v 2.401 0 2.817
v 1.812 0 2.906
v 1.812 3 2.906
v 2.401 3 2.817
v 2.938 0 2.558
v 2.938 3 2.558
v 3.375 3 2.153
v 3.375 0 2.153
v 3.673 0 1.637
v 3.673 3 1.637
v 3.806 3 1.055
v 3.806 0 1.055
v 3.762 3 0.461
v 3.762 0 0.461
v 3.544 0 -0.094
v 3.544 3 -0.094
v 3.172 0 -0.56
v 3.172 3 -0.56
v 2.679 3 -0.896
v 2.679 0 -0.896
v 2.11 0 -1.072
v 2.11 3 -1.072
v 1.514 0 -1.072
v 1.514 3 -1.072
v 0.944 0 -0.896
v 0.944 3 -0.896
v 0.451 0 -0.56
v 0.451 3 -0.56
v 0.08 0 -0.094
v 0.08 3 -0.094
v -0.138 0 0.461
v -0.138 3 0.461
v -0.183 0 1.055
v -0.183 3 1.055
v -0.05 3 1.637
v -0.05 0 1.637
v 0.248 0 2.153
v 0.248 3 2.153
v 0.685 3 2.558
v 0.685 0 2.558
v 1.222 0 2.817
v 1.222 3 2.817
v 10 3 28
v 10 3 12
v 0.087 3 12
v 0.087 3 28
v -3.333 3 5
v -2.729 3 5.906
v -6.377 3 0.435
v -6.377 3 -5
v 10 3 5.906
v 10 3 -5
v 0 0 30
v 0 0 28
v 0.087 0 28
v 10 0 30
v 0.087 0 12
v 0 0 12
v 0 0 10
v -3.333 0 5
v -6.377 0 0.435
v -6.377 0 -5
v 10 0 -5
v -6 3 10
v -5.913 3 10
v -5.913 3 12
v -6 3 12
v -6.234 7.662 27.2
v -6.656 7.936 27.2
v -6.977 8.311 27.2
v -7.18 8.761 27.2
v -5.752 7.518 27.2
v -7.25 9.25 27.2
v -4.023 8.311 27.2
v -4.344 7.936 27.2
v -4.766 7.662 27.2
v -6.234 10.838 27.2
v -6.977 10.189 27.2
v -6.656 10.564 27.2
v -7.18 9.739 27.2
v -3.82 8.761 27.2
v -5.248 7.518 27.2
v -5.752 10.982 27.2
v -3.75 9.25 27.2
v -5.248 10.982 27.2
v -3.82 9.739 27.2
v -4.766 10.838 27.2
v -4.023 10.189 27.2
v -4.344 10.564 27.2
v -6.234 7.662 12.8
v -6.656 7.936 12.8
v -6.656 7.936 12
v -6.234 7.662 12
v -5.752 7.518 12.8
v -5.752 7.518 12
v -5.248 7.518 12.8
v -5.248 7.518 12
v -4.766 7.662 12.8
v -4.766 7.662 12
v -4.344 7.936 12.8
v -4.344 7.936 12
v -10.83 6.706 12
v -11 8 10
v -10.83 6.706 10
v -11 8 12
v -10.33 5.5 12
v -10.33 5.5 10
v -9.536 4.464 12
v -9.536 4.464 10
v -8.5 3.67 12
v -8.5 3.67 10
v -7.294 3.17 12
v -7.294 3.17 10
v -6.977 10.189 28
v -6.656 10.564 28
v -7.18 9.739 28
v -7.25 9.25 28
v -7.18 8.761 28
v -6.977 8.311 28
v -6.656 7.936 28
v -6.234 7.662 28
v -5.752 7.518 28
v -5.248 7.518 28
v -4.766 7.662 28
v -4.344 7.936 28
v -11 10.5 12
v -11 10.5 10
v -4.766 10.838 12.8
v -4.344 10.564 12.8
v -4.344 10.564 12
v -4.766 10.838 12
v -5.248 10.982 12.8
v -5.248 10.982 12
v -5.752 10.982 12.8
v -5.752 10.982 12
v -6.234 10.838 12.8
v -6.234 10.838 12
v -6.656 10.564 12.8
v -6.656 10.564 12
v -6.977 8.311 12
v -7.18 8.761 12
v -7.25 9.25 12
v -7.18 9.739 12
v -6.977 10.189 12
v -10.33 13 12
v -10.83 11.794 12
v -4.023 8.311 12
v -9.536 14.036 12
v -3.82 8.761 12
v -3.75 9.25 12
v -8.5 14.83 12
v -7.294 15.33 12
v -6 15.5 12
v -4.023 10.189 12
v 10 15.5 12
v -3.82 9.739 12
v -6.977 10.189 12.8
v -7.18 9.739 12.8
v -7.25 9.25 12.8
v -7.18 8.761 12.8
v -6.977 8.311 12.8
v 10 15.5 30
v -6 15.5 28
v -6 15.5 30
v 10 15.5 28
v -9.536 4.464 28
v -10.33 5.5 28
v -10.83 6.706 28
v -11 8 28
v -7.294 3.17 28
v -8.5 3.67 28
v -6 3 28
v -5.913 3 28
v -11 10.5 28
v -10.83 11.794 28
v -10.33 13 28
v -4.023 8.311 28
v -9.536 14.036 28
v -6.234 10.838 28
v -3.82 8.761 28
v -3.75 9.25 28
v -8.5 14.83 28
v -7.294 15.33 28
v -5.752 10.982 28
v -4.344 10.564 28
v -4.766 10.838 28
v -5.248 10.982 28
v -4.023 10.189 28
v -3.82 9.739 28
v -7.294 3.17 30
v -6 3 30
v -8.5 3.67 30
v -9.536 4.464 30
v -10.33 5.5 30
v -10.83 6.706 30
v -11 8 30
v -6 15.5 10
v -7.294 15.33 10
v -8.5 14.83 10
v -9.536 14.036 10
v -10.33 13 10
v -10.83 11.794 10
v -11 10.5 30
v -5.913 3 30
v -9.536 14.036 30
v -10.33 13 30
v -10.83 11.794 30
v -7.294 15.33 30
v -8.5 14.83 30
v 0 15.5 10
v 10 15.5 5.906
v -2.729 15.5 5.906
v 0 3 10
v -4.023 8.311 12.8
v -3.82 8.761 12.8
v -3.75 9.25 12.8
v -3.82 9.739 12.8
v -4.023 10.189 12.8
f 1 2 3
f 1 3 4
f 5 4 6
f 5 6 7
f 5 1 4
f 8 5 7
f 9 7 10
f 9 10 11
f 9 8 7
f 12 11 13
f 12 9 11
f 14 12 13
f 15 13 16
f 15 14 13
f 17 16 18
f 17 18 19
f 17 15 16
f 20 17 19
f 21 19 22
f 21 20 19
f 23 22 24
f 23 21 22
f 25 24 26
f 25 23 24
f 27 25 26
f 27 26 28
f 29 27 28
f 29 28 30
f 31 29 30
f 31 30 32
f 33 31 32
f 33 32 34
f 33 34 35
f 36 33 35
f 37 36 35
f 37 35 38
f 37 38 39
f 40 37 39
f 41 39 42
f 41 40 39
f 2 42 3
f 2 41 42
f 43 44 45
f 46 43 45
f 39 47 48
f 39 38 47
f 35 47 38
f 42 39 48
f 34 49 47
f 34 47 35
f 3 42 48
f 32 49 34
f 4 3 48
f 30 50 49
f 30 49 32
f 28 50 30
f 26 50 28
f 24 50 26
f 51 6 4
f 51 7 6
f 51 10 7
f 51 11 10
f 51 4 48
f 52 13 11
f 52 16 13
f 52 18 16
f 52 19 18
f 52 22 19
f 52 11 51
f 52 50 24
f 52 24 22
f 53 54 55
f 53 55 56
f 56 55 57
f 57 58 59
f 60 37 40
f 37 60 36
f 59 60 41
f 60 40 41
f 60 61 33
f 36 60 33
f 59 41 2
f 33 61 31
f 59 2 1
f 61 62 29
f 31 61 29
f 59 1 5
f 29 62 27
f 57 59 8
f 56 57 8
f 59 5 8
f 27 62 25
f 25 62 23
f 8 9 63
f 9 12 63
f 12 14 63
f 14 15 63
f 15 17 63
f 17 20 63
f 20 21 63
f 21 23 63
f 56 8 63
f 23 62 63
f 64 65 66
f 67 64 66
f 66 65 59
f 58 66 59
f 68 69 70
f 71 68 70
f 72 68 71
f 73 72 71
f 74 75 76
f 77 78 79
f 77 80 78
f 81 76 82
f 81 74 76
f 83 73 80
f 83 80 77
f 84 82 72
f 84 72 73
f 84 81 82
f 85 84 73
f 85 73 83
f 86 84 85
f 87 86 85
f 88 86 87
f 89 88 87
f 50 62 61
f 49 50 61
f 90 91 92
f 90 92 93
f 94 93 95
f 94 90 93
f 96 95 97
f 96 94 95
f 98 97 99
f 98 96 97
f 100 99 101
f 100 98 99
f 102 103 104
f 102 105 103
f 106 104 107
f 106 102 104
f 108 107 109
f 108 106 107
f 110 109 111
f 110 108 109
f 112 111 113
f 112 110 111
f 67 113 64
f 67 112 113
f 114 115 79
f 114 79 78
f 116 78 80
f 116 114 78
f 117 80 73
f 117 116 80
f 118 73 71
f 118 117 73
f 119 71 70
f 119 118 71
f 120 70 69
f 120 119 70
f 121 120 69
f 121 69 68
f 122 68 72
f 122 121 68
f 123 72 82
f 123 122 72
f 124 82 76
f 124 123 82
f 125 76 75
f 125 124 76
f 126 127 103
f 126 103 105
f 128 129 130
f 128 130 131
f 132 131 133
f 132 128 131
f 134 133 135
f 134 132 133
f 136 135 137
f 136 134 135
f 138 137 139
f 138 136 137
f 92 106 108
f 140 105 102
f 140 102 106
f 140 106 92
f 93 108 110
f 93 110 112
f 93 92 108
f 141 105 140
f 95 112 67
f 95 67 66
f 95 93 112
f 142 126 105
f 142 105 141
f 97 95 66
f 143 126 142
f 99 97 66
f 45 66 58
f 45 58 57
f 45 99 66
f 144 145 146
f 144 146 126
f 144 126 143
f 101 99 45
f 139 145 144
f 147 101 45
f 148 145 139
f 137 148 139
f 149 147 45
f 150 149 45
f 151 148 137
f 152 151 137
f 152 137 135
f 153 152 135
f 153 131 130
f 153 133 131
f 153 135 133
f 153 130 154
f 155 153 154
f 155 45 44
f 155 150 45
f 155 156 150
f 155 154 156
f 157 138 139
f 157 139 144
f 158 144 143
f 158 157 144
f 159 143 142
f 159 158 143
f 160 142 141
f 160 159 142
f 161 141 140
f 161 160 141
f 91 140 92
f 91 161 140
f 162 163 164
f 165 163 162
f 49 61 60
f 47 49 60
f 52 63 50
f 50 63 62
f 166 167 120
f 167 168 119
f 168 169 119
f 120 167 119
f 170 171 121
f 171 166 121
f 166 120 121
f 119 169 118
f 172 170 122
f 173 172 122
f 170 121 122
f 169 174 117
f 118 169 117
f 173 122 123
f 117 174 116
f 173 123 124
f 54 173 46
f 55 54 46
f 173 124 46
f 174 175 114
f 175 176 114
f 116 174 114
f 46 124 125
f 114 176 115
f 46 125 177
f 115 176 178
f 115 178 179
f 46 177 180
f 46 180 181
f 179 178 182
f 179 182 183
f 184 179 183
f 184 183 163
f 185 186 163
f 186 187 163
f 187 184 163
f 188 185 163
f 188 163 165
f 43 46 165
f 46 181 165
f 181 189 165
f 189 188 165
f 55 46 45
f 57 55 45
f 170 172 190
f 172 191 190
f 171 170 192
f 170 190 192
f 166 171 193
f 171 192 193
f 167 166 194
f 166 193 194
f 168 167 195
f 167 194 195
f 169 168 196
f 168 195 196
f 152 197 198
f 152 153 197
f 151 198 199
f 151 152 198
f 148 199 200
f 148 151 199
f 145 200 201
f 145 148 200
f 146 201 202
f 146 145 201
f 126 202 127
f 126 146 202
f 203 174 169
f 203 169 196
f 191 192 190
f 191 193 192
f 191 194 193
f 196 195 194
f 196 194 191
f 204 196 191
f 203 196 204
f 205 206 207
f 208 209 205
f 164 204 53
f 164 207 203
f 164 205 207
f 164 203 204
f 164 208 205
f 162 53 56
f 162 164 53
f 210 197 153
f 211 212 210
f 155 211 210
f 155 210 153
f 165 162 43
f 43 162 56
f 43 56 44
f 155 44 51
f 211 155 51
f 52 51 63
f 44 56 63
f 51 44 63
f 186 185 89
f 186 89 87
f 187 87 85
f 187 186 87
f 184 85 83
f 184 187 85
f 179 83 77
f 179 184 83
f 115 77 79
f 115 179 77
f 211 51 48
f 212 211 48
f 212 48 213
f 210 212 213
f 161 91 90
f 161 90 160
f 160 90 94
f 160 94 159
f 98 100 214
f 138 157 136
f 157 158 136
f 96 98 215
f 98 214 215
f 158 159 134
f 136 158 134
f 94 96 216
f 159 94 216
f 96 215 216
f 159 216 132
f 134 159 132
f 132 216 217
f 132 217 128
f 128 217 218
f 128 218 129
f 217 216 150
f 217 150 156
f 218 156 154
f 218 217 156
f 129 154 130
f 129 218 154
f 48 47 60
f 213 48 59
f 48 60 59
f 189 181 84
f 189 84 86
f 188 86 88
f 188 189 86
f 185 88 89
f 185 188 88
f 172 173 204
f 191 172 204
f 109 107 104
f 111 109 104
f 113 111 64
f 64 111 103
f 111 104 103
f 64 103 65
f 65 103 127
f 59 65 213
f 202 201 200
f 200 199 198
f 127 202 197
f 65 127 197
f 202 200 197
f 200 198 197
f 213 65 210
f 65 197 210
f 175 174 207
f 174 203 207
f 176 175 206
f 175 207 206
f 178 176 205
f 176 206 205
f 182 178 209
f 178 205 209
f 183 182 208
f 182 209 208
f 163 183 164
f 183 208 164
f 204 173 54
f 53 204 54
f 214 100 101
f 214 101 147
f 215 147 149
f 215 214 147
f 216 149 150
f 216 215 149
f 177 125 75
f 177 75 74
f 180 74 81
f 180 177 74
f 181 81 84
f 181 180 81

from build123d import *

# Parameters (mm, degrees)
ESBO_O1_R                     = 2
ESBO_O1_W                     = 10
ESBO_O1_H                     = 16
ESBO_O1_H_2                   = 2
RESSALTO_EXTRUS_O1_DEPTH      = 3
ESBO_O1_4_W                   = 10
ESBO_O1_4_H                   = 2
RESSALTO_EXTRUS_O5_DEPTH      = 15.5
RESSALTO_EXTRUS_O6_DEPTH      = 12.5
ESBO_O11_W                    = 2
ESBO_O11_H                    = 12.5
RESSALTO_EXTRUS_O7_DEPTH      = 11
RESSALTO_EXTRUS_O8_DEPTH      = 18
ESBO_O8_W                     = 14.4
ESBO_O8_H                     = 12.5
CORTE_EXTRUS_O1_DEPTH         = 40.764934301
FILETE1_R                     = 5
RESSALTO_EXTRUS_O9_DEPTH      = 2
RESSALTO_EXTRUS_O9_DEPTH_BACK = 18
ESBO_O18_W                    = 6
ESBO_O18_H                    = 16
CORTE_EXTRUS_O3_DEPTH         = 35.311076929


with BuildPart() as part:
    # Esboço1 → Ressalto-extrusão1 (new body)
    # profile 1 of 9: a face of its own
    with BuildSketch(Plane(origin=(0, 0, 0), x_dir=(1, 0, 0), z_dir=(0, 1, 0))):
        Polygon((10, 5), (-6.376571145, 5), (-6.376571145, -0.435143283), (-3.333333333, -5), (10, -5), align=None)
        with Locations(Location((1.811714428, -0.905857214, 0), (0, 0, 270))):
            Circle(ESBO_O1_R, mode=Mode.SUBTRACT)
    # profile 2 of 9: a face of its own
    with BuildSketch(Plane(origin=(0, 0, 0), x_dir=(1, 0, 0), z_dir=(0, 1, 0))):
        Polygon((10, -5), (-3.333333333, -5), (0, -10), (5, -10), (10, -10), align=None)
    # profile 3 of 9: a face of its own
    with BuildSketch(Plane(origin=(0, 0, 0), x_dir=(1, 0, 0), z_dir=(0, 1, 0))):
        Polygon((10, -5), (-3.333333333, -5), (0, -10), (5, -10), (10, -10), align=None)
    # profile 4 of 9: a face of its own
    with BuildSketch(Plane(origin=(0, 0, 0), x_dir=(1, 0, 0), z_dir=(0, 1, 0))):
        Polygon((10, -5), (-3.333333333, -5), (0, -10), (5, -10), (10, -10), align=None)
    # profile 5 of 9: a face of its own
    with BuildSketch(Plane(origin=(0, 0, 0), x_dir=(1, 0, 0), z_dir=(0, 1, 0))):
        Polygon((10, -5), (-3.333333333, -5), (0, -10), (5, -10), (10, -10), align=None)
    # profile 6 of 9: a face of its own
    with BuildSketch(Plane(origin=(0, 0, 0), x_dir=(1, 0, 0), z_dir=(0, 1, 0))):
        with Locations((5, -20)):
            Rectangle(ESBO_O1_W, ESBO_O1_H)
    # profile 7 of 9: a face of its own
    with BuildSketch(Plane(origin=(0, 0, 0), x_dir=(1, 0, 0), z_dir=(0, 1, 0))):
        with Locations((5, -29)):
            Rectangle(ESBO_O1_W, ESBO_O1_H_2)
    # profile 8 of 9: a face of its own
    with BuildSketch(Plane(origin=(0, 0, 0), x_dir=(1, 0, 0), z_dir=(0, 1, 0))):
        with Locations((5, -20)):
            Rectangle(ESBO_O1_W, ESBO_O1_H)
    # profile 9 of 9: a face of its own
    with BuildSketch(Plane(origin=(0, 0, 0), x_dir=(1, 0, 0), z_dir=(0, 1, 0))):
        Polygon((5, -10), (0, -10), (0, -12), (10, -12), (10, -10), align=None)
    extrude(amount=RESSALTO_EXTRUS_O1_DEPTH)

    # Esboço1<4> → Ressalto-extrusão5 (add)
    with BuildSketch(Plane(origin=(0, 0, 0), x_dir=(1, 0, 0), z_dir=(0, 1, 0))):
        with Locations((5, -11)):
            Rectangle(ESBO_O1_4_W, ESBO_O1_4_H)
        with Locations((5, -29)):
            Rectangle(ESBO_O1_4_W, ESBO_O1_4_H)
    extrude(amount=RESSALTO_EXTRUS_O5_DEPTH)

    # Esboço10 → Ressalto-extrusão6 (add)
    with BuildSketch(Plane(origin=(0, 3, 0), x_dir=(1, 0, 0), z_dir=(0, 1, 0))):
        Polygon((-2.729428524, -5.905857214), (0, -10), (10, -10), (10, -5.905857214), (1.811714428, -5.905857214), (0, -5.905857214), align=None)
    extrude(amount=RESSALTO_EXTRUS_O6_DEPTH)

    # Esboço11 → Ressalto-extrusão7 (add)
    with BuildSketch(Plane.ZY):
        with Locations((11, 9.25)):
            Rectangle(ESBO_O11_W, ESBO_O11_H)
        with Locations((29, 9.25)):
            Rectangle(ESBO_O11_W, ESBO_O11_H)
    extrude(amount=RESSALTO_EXTRUS_O7_DEPTH)

    # Esboço12 → Ressalto-extrusão8 (add)
    with BuildSketch(Plane.XY.offset(30)):
        with BuildLine():
            ThreePointArc((-6.656098816, 10.563748655), (-7.25, 9.25), (-6.656098816, 7.936251345))
            Line((-6.656098816, 7.936251345), (-5.5, 9.25))
            Line((-5.5, 9.25), (-6.656098816, 10.563748655))
        make_face()
        with BuildLine():
            Line((-5.5, 9.25), (-6.656098816, 7.936251345))
            ThreePointArc((-6.656098816, 7.936251345), (-5.5, 7.5), (-4.343901184, 7.936251345))
            Line((-4.343901184, 7.936251345), (-5.5, 9.25))
        make_face()
        with BuildLine():
            Line((-6.656098816, 10.563748655), (-5.5, 9.25))
            Line((-5.5, 9.25), (-4.343901184, 10.563748655))
            ThreePointArc((-4.343901184, 10.563748655), (-5.5, 11), (-6.656098816, 10.563748655))
        make_face()
        with BuildLine():
            Line((-4.343901184, 10.563748655), (-5.5, 9.25))
            Line((-5.5, 9.25), (-4.343901184, 7.936251345))
            ThreePointArc((-4.343901184, 7.936251345), (-3.905372625, 8.529123079), (-3.75, 9.25))
            ThreePointArc((-3.75, 9.25), (-3.905372625, 9.970876921), (-4.343901184, 10.563748655))
        make_face()
    extrude(amount=-RESSALTO_EXTRUS_O8_DEPTH)

    # Esboço8 → Corte-extrusão1 (cut, through all)
    with BuildSketch(Plane(origin=(10, 0, 0), x_dir=(0, 0, -1), z_dir=(1, 0, 0))):
        with Locations((-20, 9.25)):
            Rectangle(ESBO_O8_W, ESBO_O8_H)
    extrude(amount=-CORTE_EXTRUS_O1_DEPTH, mode=Mode.SUBTRACT)

    # Filete1
    filete1_edges = [part.edges().sort_by_distance(p)[0] for p in [
        (-11, 15.5, 11),
        (-11, 3, 11),
        (-11, 3, 29),
        (-11, 15.5, 29),
    ]]
    fillet(filete1_edges, radius=FILETE1_R)

    # Esboço14 → Ressalto-extrusão9 (add, two sides: drawn at the far end of the back side and taken through both)
    with BuildSketch(Plane(origin=(0, 3, 28), x_dir=(1, 0, 0), z_dir=(0, 0, 1)).offset(-RESSALTO_EXTRUS_O9_DEPTH_BACK)):
        Polygon((0, -3), (-2.25, 0), (-5.913171112, 0), align=None)
        Polygon((0, 0), (-2.25, 0), (0, -3), align=None)
    extrude(amount=RESSALTO_EXTRUS_O9_DEPTH + RESSALTO_EXTRUS_O9_DEPTH_BACK)

    # Esboço18 → Corte-extrusão3 (cut, through all)
    with BuildSketch(Plane(origin=(0, 3, 0), x_dir=(1, 0, 0), z_dir=(0, 1, 0))):
        with Locations((-2.913171112, -20)):
            Rectangle(ESBO_O18_W, ESBO_O18_H)
    extrude(amount=-CORTE_EXTRUS_O3_DEPTH, mode=Mode.SUBTRACT)


solid = part.part
